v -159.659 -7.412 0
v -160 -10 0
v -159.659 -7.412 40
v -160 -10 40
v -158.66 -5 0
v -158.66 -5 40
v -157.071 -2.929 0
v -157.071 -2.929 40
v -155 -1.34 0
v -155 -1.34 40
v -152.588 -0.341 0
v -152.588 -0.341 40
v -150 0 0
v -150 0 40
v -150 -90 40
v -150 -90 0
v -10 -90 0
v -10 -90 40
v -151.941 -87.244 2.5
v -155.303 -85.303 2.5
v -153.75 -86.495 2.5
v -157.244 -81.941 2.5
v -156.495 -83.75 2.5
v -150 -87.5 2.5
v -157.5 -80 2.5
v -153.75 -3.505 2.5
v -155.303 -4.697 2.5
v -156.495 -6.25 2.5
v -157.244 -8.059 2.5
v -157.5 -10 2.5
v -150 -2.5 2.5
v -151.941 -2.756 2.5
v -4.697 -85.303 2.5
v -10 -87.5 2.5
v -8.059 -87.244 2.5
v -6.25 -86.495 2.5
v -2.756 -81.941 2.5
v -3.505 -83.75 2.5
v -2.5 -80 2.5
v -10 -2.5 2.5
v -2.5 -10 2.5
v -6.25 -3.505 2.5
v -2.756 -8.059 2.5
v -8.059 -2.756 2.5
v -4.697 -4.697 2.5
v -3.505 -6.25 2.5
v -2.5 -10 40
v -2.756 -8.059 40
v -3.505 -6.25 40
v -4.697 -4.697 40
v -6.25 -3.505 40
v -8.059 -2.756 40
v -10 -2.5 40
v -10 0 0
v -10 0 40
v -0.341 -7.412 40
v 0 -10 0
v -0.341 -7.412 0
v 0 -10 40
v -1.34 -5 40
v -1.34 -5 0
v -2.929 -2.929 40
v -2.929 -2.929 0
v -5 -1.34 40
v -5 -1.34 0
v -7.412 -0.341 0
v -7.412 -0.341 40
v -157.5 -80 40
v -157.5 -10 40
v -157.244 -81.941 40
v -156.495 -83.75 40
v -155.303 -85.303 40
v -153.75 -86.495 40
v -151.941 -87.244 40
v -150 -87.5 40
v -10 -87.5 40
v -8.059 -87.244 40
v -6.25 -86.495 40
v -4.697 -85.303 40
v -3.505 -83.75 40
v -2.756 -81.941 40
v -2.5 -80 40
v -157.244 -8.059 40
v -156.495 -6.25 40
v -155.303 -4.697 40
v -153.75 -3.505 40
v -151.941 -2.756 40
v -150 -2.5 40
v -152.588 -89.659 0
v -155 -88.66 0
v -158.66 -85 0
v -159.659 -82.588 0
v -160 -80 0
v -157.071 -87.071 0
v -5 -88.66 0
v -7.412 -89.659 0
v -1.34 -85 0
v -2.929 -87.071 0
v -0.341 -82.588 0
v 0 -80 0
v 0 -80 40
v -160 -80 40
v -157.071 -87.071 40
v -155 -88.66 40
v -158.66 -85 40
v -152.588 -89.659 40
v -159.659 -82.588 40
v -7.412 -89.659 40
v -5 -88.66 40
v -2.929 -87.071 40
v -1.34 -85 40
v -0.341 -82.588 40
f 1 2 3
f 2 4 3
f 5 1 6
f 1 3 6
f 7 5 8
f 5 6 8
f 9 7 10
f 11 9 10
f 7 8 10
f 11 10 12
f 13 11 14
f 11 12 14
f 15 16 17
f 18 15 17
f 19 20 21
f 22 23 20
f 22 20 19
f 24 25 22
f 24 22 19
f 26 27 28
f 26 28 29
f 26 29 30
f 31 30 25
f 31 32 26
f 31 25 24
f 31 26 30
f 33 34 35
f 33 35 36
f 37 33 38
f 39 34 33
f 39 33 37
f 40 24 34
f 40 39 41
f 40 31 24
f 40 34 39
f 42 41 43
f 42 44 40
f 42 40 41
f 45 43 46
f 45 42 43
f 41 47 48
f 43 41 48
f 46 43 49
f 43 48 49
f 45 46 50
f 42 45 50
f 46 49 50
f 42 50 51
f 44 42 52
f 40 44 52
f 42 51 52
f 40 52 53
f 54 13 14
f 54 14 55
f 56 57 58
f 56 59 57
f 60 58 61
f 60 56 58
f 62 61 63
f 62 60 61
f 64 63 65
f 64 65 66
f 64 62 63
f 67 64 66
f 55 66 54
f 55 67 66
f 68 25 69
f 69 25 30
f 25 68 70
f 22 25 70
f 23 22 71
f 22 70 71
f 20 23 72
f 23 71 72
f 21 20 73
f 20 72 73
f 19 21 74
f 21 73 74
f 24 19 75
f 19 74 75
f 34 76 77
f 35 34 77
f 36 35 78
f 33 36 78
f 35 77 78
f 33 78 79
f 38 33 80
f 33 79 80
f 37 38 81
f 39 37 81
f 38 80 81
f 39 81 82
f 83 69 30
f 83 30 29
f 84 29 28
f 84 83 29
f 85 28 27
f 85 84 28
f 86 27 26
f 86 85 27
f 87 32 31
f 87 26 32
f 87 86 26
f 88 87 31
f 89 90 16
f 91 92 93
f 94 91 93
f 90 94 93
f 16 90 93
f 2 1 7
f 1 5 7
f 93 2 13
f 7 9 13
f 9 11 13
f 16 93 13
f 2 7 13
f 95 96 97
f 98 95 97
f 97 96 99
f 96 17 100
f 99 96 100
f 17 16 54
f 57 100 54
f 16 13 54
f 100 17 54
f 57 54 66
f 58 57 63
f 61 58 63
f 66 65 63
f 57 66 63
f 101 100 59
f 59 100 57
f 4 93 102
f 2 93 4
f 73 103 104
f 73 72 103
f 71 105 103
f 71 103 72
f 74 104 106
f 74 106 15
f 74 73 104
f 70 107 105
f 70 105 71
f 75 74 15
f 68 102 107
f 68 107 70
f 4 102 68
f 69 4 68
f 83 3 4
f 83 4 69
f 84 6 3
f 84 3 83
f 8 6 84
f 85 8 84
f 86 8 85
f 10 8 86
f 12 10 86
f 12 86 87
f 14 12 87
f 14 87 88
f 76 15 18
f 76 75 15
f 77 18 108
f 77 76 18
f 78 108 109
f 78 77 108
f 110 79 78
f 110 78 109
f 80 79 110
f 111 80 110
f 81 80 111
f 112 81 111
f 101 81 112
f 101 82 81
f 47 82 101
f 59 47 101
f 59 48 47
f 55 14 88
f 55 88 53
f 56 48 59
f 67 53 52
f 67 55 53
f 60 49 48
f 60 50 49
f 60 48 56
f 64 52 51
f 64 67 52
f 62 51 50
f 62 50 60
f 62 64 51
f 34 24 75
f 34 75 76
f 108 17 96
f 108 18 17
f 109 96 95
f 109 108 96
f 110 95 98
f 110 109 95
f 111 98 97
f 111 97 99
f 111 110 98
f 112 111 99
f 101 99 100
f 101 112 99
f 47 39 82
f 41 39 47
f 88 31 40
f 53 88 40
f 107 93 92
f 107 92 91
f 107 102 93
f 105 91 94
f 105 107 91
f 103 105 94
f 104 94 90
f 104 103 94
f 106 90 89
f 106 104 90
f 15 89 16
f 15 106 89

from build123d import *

# Parameters (mm, degrees)
F0_W     = 160
F0_H     = 90
F1_DEPTH = 40
F2_R     = 10
F3_T     = -2.5


with BuildPart() as f1:
    # F0 (on Top) → F1 (new body)
    with BuildSketch(Plane.XY):
        with Locations((-80, -45)):
            Rectangle(F0_W, F0_H)
    extrude(amount=F1_DEPTH)

    # F2
    f2_edges = [f1.edges().sort_by_distance(p)[0] for p in [
        (-160, -90, 20),
        (0, 0, 20),
        (0, -90, 20),
        (-160, 0, 20),
    ]]
    fillet(f2_edges, radius=F2_R)

    # F3
    f3_openings = [f1.faces().sort_by_distance(p)[0] for p in [
        (-80, -45, 40),
    ]]
    offset(amount=F3_T, openings=f3_openings)


solid = f1.part
